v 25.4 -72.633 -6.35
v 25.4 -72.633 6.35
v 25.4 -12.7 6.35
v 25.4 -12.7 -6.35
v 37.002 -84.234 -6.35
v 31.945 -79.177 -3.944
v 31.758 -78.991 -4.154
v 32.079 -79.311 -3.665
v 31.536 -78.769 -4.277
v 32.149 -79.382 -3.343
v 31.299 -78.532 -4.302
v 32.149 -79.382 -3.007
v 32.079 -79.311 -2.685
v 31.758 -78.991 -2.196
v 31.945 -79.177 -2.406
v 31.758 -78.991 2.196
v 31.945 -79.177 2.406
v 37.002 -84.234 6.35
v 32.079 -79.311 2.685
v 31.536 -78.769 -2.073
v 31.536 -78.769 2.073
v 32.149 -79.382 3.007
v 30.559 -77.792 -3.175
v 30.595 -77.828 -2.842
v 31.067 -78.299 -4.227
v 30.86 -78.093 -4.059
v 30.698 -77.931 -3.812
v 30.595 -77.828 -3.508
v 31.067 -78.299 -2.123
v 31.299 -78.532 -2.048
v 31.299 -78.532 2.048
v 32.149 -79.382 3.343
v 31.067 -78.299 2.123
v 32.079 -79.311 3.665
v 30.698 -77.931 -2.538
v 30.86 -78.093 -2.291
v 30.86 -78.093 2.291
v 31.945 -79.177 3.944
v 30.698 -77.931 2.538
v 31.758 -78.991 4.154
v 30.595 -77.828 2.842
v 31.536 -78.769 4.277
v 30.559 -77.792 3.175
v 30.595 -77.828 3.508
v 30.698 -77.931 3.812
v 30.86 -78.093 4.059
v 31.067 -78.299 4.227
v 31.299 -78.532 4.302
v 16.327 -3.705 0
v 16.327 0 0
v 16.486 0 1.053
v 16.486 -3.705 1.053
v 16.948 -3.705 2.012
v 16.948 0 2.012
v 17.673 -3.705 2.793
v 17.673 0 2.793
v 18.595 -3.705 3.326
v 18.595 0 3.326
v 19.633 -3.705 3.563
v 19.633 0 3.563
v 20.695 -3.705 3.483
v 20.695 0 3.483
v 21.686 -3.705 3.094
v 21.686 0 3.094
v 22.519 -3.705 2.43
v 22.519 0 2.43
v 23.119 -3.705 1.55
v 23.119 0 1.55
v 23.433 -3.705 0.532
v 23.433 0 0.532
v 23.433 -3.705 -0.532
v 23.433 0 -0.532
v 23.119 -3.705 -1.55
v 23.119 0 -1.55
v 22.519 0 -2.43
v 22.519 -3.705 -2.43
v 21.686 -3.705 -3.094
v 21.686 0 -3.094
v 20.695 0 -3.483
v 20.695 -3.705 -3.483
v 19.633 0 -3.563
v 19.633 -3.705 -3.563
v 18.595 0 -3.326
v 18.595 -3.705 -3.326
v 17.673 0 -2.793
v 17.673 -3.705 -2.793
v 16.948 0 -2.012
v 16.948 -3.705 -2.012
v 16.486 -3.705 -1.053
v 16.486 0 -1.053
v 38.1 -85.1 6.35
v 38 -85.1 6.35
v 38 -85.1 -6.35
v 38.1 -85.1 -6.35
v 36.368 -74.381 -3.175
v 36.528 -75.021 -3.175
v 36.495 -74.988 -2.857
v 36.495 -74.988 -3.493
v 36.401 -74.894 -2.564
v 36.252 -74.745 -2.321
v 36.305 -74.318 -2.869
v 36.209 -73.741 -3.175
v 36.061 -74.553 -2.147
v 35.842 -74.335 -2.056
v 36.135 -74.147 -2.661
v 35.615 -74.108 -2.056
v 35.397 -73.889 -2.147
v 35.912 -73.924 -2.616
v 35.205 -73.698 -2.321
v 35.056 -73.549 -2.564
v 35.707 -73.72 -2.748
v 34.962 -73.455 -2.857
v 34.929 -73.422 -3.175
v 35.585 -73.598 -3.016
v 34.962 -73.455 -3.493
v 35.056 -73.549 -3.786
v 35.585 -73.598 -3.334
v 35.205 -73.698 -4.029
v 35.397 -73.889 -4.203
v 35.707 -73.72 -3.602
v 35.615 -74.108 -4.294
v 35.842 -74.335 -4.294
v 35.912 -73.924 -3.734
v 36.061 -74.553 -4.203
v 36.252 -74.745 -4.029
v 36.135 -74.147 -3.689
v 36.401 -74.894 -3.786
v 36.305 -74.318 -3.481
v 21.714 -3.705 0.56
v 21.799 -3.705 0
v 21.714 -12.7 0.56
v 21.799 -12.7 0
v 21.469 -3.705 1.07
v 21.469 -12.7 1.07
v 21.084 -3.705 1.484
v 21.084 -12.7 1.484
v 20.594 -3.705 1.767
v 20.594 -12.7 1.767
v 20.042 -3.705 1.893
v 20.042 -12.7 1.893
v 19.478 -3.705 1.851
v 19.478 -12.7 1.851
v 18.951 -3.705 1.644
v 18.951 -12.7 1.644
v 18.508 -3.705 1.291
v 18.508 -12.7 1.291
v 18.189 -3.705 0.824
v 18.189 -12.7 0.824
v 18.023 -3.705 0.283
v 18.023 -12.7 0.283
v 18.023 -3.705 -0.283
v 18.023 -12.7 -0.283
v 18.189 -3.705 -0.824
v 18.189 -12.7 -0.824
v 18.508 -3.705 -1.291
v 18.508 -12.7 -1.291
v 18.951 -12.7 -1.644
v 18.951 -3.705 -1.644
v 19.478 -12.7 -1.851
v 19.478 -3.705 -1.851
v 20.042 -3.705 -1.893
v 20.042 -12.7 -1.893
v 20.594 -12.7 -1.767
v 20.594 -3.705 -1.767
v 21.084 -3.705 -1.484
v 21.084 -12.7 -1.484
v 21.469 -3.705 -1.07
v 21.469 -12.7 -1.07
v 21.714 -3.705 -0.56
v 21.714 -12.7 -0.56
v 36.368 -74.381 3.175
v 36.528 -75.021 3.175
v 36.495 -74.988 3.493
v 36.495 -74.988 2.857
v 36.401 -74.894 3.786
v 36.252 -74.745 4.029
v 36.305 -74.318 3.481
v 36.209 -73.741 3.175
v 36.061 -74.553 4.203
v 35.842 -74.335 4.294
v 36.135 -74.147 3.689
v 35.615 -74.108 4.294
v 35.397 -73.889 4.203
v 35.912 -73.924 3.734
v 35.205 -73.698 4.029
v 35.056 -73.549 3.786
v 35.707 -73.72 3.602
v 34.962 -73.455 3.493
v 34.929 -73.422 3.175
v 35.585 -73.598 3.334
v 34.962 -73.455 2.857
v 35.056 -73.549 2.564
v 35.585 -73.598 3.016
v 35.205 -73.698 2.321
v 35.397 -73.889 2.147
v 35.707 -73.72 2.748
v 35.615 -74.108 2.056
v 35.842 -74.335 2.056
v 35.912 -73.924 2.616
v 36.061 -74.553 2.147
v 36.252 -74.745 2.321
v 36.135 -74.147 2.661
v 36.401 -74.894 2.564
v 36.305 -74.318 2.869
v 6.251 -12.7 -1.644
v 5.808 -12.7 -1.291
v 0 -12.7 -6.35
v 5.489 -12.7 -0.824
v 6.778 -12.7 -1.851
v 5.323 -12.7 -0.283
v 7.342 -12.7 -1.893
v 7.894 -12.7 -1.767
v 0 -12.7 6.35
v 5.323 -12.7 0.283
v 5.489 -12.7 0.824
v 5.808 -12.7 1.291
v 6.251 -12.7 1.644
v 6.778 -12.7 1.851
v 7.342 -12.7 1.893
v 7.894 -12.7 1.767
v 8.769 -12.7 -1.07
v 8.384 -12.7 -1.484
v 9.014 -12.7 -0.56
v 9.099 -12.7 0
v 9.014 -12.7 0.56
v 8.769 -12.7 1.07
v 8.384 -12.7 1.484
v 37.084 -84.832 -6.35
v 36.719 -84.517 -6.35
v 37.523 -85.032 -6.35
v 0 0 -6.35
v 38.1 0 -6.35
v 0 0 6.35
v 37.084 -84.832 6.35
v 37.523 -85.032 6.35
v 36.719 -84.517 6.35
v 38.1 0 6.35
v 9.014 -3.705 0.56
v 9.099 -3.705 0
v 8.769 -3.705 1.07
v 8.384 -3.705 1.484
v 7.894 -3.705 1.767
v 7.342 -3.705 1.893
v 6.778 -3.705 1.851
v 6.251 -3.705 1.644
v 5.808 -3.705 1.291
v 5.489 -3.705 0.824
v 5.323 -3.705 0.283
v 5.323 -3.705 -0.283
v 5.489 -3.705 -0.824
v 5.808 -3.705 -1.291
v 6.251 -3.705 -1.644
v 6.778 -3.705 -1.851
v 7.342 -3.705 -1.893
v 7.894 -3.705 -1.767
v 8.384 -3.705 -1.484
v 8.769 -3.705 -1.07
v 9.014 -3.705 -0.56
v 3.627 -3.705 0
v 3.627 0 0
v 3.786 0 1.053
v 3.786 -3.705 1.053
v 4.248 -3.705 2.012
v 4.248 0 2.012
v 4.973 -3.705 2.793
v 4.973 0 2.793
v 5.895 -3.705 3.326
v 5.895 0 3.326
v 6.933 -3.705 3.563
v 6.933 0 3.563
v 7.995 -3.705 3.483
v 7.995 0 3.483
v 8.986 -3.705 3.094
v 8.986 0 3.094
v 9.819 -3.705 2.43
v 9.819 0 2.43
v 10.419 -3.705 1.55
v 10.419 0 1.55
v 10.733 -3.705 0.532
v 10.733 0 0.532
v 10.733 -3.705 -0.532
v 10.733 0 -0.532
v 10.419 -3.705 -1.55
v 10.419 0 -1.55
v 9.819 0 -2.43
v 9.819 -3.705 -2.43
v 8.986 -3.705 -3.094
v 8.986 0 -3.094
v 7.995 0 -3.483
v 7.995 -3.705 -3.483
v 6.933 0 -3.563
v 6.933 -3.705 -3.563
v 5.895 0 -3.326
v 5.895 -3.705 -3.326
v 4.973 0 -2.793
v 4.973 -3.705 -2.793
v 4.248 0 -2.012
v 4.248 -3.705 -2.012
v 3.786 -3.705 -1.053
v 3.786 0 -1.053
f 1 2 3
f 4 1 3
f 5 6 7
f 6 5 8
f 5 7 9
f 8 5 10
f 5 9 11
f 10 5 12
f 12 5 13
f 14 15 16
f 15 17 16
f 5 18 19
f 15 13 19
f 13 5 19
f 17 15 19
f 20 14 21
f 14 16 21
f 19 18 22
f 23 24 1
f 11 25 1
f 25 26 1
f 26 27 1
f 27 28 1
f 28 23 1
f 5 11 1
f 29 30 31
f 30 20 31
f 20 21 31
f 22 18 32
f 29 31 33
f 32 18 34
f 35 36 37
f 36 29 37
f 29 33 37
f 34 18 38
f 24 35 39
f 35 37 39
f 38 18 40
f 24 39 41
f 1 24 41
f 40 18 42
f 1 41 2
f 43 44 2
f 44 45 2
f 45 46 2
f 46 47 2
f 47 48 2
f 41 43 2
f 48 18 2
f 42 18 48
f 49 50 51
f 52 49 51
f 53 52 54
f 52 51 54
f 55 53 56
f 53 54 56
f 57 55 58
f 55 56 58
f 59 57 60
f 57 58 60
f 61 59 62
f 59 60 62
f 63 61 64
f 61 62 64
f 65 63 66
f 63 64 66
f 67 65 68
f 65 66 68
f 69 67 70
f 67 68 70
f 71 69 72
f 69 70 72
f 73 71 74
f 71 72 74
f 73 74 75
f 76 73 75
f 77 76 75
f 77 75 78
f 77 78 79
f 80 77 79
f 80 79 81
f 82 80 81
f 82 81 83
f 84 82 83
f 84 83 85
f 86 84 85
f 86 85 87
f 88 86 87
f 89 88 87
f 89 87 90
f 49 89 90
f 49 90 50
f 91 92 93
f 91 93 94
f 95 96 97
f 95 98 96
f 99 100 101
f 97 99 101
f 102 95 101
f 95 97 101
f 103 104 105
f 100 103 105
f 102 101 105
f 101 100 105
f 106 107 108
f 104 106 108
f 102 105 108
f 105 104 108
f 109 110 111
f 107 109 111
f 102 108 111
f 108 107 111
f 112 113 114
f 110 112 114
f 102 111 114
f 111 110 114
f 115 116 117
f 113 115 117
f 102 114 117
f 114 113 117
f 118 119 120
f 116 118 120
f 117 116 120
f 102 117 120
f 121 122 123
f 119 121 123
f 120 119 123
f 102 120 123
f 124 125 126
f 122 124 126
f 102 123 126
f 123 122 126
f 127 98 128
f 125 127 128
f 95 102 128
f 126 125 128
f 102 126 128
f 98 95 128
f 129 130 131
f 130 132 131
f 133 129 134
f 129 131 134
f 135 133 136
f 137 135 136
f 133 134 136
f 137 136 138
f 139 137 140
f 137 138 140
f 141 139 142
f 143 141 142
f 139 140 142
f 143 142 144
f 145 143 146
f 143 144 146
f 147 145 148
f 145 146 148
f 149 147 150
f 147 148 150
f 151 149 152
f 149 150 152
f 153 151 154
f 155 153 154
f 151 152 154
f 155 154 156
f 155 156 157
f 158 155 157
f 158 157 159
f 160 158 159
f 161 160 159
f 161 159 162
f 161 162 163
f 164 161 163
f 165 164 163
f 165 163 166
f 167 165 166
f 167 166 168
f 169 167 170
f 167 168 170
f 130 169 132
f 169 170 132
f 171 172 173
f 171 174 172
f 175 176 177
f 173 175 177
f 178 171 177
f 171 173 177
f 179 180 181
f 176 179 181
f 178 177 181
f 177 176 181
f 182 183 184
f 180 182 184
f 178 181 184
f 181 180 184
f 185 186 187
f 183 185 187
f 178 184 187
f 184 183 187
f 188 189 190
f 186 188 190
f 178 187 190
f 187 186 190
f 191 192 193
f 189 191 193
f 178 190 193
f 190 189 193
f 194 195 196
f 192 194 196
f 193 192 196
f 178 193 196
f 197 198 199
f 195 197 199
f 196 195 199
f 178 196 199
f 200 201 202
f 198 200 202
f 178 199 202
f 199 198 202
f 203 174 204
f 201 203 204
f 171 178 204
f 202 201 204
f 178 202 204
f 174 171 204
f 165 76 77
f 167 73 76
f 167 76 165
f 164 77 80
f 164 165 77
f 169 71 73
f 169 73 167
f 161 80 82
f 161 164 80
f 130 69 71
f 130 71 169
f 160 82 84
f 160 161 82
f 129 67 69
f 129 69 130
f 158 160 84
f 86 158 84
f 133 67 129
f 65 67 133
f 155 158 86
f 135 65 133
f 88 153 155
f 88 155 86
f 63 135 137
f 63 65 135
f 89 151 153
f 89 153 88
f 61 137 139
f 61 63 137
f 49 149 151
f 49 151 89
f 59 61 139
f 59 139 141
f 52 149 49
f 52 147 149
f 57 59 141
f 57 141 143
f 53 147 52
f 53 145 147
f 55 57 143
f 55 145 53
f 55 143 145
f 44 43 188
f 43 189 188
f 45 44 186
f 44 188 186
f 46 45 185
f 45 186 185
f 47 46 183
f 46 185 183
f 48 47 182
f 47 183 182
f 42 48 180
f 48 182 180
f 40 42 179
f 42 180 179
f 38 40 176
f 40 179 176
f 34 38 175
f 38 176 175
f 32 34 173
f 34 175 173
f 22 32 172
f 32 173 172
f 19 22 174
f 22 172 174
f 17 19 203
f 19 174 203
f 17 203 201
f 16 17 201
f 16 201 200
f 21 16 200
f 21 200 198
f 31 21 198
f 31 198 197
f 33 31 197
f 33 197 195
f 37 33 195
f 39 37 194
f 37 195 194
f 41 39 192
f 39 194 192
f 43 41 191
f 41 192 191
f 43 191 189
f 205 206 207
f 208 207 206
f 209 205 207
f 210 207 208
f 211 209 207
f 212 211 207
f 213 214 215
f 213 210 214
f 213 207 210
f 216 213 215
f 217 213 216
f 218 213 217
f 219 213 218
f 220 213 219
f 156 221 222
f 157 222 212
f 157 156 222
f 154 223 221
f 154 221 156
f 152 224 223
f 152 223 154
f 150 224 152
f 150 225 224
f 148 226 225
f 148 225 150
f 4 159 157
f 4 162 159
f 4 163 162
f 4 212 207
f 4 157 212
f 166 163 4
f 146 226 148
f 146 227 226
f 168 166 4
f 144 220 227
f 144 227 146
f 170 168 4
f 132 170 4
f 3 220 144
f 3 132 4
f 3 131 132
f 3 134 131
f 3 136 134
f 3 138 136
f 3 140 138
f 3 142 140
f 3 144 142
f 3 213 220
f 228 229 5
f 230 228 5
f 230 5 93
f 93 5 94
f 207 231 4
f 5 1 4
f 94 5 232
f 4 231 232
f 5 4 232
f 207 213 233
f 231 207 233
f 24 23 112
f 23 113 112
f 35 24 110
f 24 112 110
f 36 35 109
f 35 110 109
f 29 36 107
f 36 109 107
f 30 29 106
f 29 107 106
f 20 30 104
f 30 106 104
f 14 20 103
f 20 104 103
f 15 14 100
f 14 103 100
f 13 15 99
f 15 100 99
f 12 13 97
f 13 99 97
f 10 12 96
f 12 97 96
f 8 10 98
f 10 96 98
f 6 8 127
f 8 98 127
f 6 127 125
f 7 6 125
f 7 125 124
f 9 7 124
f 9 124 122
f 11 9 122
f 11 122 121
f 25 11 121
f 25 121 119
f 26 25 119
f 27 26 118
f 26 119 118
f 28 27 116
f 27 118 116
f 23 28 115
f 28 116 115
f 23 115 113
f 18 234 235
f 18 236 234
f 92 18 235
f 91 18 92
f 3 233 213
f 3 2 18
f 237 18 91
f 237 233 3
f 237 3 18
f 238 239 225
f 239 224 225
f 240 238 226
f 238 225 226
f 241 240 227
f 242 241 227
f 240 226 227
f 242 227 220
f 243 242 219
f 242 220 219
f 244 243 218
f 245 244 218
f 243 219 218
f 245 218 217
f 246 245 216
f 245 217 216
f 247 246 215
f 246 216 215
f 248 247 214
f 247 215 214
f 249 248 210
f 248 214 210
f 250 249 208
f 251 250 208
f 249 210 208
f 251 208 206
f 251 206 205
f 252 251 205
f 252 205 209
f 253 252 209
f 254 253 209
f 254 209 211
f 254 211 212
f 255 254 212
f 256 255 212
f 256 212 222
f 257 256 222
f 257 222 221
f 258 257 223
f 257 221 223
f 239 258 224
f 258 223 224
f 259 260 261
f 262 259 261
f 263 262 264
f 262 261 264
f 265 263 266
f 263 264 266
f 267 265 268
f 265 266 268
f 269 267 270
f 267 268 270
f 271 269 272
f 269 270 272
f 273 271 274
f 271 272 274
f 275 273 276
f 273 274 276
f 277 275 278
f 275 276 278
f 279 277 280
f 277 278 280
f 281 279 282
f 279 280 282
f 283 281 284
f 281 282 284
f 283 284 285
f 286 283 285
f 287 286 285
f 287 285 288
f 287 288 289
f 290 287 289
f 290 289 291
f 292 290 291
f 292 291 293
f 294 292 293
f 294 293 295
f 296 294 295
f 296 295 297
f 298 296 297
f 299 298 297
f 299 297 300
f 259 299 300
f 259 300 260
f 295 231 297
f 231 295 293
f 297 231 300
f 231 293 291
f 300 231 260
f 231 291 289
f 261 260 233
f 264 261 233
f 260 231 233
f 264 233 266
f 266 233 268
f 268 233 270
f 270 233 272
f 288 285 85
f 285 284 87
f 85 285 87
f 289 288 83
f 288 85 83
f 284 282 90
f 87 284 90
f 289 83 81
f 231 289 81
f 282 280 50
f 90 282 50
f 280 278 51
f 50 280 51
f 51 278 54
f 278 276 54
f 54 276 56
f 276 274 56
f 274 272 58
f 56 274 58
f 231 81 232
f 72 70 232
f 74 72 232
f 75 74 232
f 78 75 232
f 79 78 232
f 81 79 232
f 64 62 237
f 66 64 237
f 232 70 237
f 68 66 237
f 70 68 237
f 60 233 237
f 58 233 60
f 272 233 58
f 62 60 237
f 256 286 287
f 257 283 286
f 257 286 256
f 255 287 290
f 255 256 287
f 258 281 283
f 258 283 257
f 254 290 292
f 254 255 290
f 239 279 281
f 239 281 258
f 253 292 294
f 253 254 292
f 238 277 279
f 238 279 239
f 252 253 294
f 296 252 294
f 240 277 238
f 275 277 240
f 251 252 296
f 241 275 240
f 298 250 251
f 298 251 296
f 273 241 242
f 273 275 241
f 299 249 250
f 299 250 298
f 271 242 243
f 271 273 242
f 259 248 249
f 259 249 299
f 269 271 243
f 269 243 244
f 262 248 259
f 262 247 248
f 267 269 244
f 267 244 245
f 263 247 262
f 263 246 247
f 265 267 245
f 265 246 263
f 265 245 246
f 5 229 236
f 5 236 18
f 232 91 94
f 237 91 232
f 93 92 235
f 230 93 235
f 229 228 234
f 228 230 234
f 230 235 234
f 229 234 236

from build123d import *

# Parameters (mm, degrees)
SKETCH1_W                                      = 38.1
SKETCH1_H                                      = 85.1
BOSS_EXTRUDE1_DEPTH                            = 6.35
SKETCH2_W                                      = 25.4
SKETCH2_H                                      = 72.4
CUT_EXTRUDE1_DEPTH                             = 13.7
CBORE_FOR_6_SOCKET_HEAD_CAP_SCREW1_D           = 3.7973
CBORE_FOR_6_SOCKET_HEAD_CAP_SCREW1_CBORE_D     = 7.14502
CBORE_FOR_6_SOCKET_HEAD_CAP_SCREW1_CBORE_DEPTH = 3.7051996
CUT_EXTRUDE2_DEPTH                             = 13.7
CUT_EXTRUDE7_REACH                             = 14.7
F_4_40_TAPPED_HOLE1_D                          = 2.2606
F_4_40_TAPPED_HOLE1_DEPTH                      = 6.18
F_4_40_TAPPED_HOLE1_TIP                        = 0.679152758


with BuildPart() as part:
    # Sketch1 → Boss-Extrude1 (new body, symmetric)
    with BuildSketch(Plane.XY):
        with Locations((19.05, -42.55)):
            Rectangle(SKETCH1_W, SKETCH1_H)
    extrude(amount=BOSS_EXTRUDE1_DEPTH, both=True)

    # Sketch2 → Cut-Extrude1 (cut, through all)
    with BuildSketch(Plane.XY.offset(6.35)):
        with Locations((12.7, -48.9)):
            Rectangle(SKETCH2_W, SKETCH2_H)
    extrude(amount=-CUT_EXTRUDE1_DEPTH, mode=Mode.SUBTRACT)

    # CBORE for #6 Socket Head Cap Screw1 (through all)
    with Locations(Plane(origin=(0, 0, 0), x_dir=(-1, 0, 0), z_dir=(0, 1, 0))):
        with Locations((-7.2, 0), (-19.9, 0)):
            CounterBoreHole(CBORE_FOR_6_SOCKET_HEAD_CAP_SCREW1_D / 2, CBORE_FOR_6_SOCKET_HEAD_CAP_SCREW1_CBORE_D / 2, CBORE_FOR_6_SOCKET_HEAD_CAP_SCREW1_CBORE_DEPTH)

    # Sketch9 → Cut-Extrude2 (cut, through all)
    with BuildSketch(Plane.XY.offset(6.35)):
        with BuildLine():
            Line((25.4, -84.8), (36.685857157, -84.8))
            ThreePointArc((36.685857157, -84.8), (37.012701665, -85.021954446), (37.4, -85.1))
            Line((37.4, -85.1), (38.1, -85.1))
            Line((38.1, -85.1), (38.1, -88.1))
            Line((38.1, -88.1), (25.4, -88.1))
            Line((25.4, -88.1), (25.4, -84.8))
        make_face()
    extrude(amount=-CUT_EXTRUDE2_DEPTH, mode=Mode.SUBTRACT)

    # Sketch24 → Cut-Extrude7 (cut, up to next)
    with BuildSketch(Plane.XY.offset(6.35), mode=Mode.PRIVATE) as cut_extrude7_sk1:
        with BuildLine():
            Line((38.1, -85.1), (38, -85.1))
            ThreePointArc((38, -85.1), (37.296182614, -84.947443375), (36.71869987, -84.517157288))
            Line((36.71869987, -84.517157288), (37.001542582, -84.234314575))
            Line((37.001542582, -84.234314575), (25.4, -72.632771993))
            Line((25.4, -72.632771993), (22.894805483, -72.632771993))
            Line((22.894805483, -72.632771993), (22.894805483, -86.862285397))
            Line((22.894805483, -86.862285397), (38.1, -86.862285397))
            Line((38.1, -86.862285397), (38.1, -85.1))
        make_face()
    cut_extrude7_tool1 = extrude(cut_extrude7_sk1.sketch, amount=-CUT_EXTRUDE7_REACH, mode=Mode.PRIVATE) & part.part
    add(cut_extrude7_tool1.solids().sort_by_distance((28.474666, -81.452091, 6.35))[0], mode=Mode.SUBTRACT)

    # #4-40 Tapped Hole1
    with Locations(Plane(origin=(-19.288878517, -27.943893476, 153.694490084), x_dir=(0.707106781, -0.707106781, 0), z_dir=(-0.707106781, -0.707106781, 0))):
        with Locations((71.626370823, -150.519490084), (71.626370823, -156.869490084)):
            Hole(F_4_40_TAPPED_HOLE1_D / 2, depth=F_4_40_TAPPED_HOLE1_DEPTH)
            with Locations((0, 0, -(F_4_40_TAPPED_HOLE1_DEPTH + F_4_40_TAPPED_HOLE1_TIP / 2))):  # 118° drill point
                Cone(0, F_4_40_TAPPED_HOLE1_D / 2, F_4_40_TAPPED_HOLE1_TIP, mode=Mode.SUBTRACT)


solid = part.part
